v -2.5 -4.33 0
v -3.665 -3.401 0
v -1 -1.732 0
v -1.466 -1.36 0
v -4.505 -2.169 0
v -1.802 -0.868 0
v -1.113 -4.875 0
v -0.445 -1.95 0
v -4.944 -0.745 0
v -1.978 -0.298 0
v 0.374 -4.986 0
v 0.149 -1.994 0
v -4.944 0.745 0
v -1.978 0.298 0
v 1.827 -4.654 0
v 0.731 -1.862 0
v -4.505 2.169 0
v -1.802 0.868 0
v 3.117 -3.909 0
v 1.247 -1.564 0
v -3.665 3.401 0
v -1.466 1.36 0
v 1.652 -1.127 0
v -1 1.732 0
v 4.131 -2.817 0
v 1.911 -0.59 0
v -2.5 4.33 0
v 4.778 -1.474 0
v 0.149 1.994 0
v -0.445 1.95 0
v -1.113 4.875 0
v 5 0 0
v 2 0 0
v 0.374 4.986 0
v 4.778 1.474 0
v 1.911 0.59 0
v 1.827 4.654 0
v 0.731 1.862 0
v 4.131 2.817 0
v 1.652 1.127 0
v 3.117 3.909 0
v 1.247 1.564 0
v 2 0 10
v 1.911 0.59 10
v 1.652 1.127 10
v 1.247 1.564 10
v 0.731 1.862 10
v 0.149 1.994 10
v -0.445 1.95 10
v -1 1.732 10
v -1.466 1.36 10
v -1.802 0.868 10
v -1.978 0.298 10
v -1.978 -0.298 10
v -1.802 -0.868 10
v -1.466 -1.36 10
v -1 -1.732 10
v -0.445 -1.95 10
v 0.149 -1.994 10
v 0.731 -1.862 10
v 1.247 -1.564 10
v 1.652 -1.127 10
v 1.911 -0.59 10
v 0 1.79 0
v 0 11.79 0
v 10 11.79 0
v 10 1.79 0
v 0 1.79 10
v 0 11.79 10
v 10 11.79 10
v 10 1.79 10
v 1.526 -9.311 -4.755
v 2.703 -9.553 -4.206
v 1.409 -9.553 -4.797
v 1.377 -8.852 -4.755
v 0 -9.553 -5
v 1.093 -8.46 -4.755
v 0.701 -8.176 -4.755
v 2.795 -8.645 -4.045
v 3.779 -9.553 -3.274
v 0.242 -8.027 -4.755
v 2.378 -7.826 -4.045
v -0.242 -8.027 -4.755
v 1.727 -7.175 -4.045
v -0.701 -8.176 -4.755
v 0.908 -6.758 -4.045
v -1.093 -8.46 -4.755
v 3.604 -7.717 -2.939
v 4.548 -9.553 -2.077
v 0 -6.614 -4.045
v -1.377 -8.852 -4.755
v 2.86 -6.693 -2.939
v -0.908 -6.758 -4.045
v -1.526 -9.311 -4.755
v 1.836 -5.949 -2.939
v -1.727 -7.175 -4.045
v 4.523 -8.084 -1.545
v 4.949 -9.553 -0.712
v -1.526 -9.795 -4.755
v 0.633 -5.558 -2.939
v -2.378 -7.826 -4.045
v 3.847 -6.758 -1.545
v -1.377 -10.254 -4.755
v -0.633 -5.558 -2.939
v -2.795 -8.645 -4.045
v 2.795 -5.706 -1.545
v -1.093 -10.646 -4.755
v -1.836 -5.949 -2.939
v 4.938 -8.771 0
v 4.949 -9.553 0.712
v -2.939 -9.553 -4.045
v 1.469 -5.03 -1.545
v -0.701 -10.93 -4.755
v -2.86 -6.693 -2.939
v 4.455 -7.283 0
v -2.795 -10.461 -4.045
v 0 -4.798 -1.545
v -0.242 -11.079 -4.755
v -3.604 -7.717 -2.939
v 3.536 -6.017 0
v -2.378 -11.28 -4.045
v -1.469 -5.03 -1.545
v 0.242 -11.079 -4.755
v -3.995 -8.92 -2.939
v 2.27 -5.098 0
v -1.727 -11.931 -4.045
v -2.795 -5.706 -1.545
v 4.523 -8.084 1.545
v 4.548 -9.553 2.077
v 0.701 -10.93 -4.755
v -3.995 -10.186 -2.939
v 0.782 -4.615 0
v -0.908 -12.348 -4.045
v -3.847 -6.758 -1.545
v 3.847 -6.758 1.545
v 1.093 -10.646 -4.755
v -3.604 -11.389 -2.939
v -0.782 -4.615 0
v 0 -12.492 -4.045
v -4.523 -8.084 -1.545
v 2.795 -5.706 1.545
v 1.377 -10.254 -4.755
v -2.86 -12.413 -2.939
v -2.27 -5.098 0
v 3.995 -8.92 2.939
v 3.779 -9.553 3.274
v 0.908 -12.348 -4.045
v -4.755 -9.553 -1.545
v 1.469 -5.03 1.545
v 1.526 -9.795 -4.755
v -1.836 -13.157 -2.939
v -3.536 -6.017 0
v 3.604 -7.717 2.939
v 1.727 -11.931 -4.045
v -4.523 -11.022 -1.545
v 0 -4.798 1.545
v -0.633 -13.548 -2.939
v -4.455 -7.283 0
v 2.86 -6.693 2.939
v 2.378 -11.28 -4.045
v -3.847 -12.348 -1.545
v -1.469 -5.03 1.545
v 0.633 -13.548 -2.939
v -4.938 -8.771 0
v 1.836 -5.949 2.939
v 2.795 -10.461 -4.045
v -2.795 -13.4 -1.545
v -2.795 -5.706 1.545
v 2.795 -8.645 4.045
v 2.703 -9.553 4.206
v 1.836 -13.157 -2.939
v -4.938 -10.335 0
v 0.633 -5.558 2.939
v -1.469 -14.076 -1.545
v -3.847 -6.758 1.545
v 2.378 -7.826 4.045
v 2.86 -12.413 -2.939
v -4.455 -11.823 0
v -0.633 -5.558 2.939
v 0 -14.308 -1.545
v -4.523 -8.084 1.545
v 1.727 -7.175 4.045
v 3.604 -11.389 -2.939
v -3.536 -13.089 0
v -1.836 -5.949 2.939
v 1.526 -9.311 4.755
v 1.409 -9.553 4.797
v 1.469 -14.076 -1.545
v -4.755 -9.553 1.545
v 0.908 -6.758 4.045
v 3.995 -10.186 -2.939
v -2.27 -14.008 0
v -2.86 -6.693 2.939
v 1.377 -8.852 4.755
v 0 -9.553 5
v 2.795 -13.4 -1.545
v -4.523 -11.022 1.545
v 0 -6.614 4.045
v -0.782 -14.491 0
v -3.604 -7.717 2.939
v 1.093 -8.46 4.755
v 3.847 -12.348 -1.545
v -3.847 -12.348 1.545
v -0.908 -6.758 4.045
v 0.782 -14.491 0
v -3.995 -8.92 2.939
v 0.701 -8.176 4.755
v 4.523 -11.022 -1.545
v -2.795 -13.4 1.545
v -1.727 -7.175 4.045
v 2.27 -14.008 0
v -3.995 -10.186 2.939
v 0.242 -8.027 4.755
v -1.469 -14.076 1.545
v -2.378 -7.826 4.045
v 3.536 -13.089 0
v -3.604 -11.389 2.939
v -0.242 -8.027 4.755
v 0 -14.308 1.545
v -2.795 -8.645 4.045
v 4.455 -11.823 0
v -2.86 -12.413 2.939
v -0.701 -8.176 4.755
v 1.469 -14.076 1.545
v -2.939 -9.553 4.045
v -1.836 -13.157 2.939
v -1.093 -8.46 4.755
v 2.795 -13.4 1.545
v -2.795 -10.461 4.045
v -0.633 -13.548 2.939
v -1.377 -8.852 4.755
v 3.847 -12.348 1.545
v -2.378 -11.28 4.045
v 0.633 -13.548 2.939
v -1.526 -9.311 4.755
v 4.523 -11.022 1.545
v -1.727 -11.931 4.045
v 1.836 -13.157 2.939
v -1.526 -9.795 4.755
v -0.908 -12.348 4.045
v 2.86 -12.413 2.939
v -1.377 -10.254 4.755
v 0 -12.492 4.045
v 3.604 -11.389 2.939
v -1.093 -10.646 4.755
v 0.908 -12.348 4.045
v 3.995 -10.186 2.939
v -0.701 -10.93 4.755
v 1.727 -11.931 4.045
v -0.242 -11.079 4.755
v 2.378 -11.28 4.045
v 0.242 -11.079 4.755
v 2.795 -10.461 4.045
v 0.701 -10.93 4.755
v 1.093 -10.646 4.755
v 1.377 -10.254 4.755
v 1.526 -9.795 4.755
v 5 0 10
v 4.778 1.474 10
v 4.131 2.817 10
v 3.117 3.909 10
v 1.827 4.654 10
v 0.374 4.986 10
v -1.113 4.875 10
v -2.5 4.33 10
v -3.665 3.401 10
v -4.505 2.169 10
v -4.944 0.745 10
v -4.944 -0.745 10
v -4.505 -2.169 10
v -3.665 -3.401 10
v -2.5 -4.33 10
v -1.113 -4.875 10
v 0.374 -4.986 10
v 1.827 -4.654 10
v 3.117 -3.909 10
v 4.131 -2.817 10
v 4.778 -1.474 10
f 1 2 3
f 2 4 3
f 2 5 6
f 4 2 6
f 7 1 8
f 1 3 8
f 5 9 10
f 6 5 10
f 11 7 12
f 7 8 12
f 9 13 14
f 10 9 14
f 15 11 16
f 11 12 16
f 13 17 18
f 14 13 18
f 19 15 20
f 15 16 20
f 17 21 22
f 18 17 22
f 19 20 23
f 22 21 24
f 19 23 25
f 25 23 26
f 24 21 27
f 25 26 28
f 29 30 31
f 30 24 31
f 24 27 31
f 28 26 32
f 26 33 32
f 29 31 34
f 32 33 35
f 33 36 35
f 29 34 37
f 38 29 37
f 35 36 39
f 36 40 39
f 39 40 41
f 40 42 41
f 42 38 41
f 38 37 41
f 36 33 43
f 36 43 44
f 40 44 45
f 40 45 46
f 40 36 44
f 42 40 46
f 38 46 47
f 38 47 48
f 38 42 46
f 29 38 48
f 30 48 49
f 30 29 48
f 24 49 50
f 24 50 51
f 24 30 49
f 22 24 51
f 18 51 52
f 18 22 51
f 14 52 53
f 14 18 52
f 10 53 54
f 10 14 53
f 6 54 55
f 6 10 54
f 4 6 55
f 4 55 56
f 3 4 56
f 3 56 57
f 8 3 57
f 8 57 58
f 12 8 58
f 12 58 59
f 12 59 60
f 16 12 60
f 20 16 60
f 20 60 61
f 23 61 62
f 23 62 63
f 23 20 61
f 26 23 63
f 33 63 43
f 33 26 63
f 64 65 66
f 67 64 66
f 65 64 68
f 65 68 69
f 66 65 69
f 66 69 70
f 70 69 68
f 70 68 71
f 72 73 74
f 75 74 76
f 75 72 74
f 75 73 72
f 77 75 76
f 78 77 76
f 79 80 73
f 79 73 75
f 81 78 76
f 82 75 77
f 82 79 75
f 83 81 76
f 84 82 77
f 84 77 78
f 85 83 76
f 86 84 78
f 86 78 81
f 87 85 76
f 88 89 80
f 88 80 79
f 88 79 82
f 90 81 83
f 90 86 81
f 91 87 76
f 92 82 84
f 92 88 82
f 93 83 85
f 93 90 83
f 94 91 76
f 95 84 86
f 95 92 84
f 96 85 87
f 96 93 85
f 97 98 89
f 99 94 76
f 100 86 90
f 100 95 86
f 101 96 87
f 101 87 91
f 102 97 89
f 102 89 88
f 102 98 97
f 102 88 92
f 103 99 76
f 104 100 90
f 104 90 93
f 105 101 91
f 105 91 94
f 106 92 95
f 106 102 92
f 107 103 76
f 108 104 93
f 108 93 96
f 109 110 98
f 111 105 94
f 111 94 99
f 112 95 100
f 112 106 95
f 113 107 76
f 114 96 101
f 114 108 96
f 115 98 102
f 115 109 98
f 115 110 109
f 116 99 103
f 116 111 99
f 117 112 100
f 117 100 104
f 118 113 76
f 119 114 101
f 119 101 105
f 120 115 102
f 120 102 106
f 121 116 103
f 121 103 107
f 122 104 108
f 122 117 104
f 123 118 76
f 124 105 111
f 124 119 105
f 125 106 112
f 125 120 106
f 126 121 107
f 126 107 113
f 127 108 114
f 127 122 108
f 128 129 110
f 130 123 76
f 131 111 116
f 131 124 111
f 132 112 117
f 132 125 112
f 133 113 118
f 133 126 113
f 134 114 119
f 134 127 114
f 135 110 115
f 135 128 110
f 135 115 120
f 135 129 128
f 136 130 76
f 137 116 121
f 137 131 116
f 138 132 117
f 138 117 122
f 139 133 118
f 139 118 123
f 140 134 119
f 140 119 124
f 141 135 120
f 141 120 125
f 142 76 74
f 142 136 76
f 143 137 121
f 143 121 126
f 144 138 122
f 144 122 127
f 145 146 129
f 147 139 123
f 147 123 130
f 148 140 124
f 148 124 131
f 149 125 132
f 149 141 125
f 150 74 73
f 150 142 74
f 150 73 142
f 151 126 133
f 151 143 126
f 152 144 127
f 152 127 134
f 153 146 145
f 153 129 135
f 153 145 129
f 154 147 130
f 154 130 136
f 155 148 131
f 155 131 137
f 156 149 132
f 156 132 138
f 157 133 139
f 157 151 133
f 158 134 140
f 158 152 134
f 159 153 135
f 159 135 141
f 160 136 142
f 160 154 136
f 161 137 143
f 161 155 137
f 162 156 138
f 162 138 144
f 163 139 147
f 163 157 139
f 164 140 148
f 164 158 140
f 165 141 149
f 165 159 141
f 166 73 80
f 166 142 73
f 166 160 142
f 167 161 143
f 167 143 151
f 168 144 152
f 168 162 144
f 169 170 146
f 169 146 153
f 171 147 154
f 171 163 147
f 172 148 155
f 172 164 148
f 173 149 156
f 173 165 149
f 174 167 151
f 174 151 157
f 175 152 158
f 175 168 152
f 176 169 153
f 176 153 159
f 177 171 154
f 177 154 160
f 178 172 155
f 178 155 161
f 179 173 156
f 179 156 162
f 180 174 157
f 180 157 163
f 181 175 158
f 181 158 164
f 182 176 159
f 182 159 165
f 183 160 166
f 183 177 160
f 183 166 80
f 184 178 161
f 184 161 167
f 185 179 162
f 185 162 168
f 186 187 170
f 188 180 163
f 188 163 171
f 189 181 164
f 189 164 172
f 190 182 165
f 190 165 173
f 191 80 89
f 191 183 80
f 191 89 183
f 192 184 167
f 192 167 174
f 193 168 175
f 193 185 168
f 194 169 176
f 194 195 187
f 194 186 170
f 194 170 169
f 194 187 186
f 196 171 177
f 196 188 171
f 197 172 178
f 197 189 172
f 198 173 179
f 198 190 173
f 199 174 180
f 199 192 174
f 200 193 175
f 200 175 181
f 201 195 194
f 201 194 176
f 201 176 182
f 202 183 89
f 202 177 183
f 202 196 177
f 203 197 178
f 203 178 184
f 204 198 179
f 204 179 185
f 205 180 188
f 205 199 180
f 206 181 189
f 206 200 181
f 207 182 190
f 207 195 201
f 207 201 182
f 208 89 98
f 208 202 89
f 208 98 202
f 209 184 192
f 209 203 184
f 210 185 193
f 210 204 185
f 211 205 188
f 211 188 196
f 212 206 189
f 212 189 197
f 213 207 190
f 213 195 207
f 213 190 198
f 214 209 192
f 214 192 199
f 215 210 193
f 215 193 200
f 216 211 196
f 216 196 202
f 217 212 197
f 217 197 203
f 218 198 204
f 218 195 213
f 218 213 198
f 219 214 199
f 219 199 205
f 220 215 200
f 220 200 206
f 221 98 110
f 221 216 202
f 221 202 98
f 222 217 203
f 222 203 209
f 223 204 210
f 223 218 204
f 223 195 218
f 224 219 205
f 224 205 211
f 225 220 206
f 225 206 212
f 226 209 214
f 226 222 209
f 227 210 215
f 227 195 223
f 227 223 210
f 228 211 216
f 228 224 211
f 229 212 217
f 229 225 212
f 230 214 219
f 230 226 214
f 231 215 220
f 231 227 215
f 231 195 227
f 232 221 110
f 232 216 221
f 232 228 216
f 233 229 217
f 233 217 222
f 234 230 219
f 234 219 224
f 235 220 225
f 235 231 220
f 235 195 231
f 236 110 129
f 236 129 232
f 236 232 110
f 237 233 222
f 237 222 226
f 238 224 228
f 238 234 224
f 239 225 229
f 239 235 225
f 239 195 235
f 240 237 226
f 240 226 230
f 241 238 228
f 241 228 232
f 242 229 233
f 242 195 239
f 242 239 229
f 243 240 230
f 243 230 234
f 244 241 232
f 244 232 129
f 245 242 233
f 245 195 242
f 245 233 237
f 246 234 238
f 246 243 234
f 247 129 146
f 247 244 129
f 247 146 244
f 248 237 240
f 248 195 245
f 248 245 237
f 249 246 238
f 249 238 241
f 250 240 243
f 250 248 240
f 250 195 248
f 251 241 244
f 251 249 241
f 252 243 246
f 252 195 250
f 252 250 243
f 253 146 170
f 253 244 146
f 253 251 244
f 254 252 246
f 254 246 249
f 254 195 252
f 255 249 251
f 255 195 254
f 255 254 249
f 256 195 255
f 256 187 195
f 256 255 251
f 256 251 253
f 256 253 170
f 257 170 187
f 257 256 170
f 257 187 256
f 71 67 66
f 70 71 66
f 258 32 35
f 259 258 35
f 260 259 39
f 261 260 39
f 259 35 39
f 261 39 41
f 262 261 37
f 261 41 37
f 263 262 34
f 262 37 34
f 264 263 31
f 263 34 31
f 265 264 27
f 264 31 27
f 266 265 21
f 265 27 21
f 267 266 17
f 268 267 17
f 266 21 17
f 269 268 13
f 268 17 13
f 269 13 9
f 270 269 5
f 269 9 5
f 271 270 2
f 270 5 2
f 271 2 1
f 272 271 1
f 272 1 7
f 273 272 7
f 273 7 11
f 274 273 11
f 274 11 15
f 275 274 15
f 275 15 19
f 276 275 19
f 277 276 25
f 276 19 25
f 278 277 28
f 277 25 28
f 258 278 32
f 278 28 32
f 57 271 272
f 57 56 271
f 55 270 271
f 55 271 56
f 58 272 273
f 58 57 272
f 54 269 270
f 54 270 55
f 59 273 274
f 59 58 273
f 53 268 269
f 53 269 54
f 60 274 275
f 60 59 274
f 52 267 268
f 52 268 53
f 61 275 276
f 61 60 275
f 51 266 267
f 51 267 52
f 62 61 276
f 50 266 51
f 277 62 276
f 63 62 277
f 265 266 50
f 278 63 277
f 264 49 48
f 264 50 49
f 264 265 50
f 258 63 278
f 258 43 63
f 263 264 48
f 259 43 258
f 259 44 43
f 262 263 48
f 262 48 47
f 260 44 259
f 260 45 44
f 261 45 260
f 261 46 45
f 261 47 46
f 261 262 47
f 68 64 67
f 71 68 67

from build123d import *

# Parameters (mm, degrees)
BOX_W      = 10
BOX_H      = 10
BOX_DEPTH  = 10
TUBE_R     = 5
TUBE_R_2   = 2
TUBE_DEPTH = 10


with BuildPart() as cube:
    # Box → Box (new body)
    with BuildSketch(Plane(origin=(0, 1.79, 0), x_dir=(1, 0, 0), z_dir=(0, 0, 1))):
        with Locations((5, 5)):
            Rectangle(BOX_W, BOX_H)
    extrude(amount=BOX_DEPTH)


with BuildPart() as sphere:
    # Sphere → Sphere (revolve)
    with BuildSketch(Plane.XZ.offset(9.553)):
        with BuildLine():
            ThreePointArc((0, -5), (5, 0), (0, 5))
            Line((0, 5), (0, -5))
        make_face()
    revolve(axis=Axis((0, -9.553, 0), (0, 0, 1)))


with BuildPart() as tube:
    # Tube → Tube (new body)
    with BuildSketch(Plane.XY):
        Circle(TUBE_R)
        Circle(TUBE_R_2, mode=Mode.SUBTRACT)
    extrude(amount=TUBE_DEPTH)


solid = Compound([cube.part, sphere.part, tube.part])
